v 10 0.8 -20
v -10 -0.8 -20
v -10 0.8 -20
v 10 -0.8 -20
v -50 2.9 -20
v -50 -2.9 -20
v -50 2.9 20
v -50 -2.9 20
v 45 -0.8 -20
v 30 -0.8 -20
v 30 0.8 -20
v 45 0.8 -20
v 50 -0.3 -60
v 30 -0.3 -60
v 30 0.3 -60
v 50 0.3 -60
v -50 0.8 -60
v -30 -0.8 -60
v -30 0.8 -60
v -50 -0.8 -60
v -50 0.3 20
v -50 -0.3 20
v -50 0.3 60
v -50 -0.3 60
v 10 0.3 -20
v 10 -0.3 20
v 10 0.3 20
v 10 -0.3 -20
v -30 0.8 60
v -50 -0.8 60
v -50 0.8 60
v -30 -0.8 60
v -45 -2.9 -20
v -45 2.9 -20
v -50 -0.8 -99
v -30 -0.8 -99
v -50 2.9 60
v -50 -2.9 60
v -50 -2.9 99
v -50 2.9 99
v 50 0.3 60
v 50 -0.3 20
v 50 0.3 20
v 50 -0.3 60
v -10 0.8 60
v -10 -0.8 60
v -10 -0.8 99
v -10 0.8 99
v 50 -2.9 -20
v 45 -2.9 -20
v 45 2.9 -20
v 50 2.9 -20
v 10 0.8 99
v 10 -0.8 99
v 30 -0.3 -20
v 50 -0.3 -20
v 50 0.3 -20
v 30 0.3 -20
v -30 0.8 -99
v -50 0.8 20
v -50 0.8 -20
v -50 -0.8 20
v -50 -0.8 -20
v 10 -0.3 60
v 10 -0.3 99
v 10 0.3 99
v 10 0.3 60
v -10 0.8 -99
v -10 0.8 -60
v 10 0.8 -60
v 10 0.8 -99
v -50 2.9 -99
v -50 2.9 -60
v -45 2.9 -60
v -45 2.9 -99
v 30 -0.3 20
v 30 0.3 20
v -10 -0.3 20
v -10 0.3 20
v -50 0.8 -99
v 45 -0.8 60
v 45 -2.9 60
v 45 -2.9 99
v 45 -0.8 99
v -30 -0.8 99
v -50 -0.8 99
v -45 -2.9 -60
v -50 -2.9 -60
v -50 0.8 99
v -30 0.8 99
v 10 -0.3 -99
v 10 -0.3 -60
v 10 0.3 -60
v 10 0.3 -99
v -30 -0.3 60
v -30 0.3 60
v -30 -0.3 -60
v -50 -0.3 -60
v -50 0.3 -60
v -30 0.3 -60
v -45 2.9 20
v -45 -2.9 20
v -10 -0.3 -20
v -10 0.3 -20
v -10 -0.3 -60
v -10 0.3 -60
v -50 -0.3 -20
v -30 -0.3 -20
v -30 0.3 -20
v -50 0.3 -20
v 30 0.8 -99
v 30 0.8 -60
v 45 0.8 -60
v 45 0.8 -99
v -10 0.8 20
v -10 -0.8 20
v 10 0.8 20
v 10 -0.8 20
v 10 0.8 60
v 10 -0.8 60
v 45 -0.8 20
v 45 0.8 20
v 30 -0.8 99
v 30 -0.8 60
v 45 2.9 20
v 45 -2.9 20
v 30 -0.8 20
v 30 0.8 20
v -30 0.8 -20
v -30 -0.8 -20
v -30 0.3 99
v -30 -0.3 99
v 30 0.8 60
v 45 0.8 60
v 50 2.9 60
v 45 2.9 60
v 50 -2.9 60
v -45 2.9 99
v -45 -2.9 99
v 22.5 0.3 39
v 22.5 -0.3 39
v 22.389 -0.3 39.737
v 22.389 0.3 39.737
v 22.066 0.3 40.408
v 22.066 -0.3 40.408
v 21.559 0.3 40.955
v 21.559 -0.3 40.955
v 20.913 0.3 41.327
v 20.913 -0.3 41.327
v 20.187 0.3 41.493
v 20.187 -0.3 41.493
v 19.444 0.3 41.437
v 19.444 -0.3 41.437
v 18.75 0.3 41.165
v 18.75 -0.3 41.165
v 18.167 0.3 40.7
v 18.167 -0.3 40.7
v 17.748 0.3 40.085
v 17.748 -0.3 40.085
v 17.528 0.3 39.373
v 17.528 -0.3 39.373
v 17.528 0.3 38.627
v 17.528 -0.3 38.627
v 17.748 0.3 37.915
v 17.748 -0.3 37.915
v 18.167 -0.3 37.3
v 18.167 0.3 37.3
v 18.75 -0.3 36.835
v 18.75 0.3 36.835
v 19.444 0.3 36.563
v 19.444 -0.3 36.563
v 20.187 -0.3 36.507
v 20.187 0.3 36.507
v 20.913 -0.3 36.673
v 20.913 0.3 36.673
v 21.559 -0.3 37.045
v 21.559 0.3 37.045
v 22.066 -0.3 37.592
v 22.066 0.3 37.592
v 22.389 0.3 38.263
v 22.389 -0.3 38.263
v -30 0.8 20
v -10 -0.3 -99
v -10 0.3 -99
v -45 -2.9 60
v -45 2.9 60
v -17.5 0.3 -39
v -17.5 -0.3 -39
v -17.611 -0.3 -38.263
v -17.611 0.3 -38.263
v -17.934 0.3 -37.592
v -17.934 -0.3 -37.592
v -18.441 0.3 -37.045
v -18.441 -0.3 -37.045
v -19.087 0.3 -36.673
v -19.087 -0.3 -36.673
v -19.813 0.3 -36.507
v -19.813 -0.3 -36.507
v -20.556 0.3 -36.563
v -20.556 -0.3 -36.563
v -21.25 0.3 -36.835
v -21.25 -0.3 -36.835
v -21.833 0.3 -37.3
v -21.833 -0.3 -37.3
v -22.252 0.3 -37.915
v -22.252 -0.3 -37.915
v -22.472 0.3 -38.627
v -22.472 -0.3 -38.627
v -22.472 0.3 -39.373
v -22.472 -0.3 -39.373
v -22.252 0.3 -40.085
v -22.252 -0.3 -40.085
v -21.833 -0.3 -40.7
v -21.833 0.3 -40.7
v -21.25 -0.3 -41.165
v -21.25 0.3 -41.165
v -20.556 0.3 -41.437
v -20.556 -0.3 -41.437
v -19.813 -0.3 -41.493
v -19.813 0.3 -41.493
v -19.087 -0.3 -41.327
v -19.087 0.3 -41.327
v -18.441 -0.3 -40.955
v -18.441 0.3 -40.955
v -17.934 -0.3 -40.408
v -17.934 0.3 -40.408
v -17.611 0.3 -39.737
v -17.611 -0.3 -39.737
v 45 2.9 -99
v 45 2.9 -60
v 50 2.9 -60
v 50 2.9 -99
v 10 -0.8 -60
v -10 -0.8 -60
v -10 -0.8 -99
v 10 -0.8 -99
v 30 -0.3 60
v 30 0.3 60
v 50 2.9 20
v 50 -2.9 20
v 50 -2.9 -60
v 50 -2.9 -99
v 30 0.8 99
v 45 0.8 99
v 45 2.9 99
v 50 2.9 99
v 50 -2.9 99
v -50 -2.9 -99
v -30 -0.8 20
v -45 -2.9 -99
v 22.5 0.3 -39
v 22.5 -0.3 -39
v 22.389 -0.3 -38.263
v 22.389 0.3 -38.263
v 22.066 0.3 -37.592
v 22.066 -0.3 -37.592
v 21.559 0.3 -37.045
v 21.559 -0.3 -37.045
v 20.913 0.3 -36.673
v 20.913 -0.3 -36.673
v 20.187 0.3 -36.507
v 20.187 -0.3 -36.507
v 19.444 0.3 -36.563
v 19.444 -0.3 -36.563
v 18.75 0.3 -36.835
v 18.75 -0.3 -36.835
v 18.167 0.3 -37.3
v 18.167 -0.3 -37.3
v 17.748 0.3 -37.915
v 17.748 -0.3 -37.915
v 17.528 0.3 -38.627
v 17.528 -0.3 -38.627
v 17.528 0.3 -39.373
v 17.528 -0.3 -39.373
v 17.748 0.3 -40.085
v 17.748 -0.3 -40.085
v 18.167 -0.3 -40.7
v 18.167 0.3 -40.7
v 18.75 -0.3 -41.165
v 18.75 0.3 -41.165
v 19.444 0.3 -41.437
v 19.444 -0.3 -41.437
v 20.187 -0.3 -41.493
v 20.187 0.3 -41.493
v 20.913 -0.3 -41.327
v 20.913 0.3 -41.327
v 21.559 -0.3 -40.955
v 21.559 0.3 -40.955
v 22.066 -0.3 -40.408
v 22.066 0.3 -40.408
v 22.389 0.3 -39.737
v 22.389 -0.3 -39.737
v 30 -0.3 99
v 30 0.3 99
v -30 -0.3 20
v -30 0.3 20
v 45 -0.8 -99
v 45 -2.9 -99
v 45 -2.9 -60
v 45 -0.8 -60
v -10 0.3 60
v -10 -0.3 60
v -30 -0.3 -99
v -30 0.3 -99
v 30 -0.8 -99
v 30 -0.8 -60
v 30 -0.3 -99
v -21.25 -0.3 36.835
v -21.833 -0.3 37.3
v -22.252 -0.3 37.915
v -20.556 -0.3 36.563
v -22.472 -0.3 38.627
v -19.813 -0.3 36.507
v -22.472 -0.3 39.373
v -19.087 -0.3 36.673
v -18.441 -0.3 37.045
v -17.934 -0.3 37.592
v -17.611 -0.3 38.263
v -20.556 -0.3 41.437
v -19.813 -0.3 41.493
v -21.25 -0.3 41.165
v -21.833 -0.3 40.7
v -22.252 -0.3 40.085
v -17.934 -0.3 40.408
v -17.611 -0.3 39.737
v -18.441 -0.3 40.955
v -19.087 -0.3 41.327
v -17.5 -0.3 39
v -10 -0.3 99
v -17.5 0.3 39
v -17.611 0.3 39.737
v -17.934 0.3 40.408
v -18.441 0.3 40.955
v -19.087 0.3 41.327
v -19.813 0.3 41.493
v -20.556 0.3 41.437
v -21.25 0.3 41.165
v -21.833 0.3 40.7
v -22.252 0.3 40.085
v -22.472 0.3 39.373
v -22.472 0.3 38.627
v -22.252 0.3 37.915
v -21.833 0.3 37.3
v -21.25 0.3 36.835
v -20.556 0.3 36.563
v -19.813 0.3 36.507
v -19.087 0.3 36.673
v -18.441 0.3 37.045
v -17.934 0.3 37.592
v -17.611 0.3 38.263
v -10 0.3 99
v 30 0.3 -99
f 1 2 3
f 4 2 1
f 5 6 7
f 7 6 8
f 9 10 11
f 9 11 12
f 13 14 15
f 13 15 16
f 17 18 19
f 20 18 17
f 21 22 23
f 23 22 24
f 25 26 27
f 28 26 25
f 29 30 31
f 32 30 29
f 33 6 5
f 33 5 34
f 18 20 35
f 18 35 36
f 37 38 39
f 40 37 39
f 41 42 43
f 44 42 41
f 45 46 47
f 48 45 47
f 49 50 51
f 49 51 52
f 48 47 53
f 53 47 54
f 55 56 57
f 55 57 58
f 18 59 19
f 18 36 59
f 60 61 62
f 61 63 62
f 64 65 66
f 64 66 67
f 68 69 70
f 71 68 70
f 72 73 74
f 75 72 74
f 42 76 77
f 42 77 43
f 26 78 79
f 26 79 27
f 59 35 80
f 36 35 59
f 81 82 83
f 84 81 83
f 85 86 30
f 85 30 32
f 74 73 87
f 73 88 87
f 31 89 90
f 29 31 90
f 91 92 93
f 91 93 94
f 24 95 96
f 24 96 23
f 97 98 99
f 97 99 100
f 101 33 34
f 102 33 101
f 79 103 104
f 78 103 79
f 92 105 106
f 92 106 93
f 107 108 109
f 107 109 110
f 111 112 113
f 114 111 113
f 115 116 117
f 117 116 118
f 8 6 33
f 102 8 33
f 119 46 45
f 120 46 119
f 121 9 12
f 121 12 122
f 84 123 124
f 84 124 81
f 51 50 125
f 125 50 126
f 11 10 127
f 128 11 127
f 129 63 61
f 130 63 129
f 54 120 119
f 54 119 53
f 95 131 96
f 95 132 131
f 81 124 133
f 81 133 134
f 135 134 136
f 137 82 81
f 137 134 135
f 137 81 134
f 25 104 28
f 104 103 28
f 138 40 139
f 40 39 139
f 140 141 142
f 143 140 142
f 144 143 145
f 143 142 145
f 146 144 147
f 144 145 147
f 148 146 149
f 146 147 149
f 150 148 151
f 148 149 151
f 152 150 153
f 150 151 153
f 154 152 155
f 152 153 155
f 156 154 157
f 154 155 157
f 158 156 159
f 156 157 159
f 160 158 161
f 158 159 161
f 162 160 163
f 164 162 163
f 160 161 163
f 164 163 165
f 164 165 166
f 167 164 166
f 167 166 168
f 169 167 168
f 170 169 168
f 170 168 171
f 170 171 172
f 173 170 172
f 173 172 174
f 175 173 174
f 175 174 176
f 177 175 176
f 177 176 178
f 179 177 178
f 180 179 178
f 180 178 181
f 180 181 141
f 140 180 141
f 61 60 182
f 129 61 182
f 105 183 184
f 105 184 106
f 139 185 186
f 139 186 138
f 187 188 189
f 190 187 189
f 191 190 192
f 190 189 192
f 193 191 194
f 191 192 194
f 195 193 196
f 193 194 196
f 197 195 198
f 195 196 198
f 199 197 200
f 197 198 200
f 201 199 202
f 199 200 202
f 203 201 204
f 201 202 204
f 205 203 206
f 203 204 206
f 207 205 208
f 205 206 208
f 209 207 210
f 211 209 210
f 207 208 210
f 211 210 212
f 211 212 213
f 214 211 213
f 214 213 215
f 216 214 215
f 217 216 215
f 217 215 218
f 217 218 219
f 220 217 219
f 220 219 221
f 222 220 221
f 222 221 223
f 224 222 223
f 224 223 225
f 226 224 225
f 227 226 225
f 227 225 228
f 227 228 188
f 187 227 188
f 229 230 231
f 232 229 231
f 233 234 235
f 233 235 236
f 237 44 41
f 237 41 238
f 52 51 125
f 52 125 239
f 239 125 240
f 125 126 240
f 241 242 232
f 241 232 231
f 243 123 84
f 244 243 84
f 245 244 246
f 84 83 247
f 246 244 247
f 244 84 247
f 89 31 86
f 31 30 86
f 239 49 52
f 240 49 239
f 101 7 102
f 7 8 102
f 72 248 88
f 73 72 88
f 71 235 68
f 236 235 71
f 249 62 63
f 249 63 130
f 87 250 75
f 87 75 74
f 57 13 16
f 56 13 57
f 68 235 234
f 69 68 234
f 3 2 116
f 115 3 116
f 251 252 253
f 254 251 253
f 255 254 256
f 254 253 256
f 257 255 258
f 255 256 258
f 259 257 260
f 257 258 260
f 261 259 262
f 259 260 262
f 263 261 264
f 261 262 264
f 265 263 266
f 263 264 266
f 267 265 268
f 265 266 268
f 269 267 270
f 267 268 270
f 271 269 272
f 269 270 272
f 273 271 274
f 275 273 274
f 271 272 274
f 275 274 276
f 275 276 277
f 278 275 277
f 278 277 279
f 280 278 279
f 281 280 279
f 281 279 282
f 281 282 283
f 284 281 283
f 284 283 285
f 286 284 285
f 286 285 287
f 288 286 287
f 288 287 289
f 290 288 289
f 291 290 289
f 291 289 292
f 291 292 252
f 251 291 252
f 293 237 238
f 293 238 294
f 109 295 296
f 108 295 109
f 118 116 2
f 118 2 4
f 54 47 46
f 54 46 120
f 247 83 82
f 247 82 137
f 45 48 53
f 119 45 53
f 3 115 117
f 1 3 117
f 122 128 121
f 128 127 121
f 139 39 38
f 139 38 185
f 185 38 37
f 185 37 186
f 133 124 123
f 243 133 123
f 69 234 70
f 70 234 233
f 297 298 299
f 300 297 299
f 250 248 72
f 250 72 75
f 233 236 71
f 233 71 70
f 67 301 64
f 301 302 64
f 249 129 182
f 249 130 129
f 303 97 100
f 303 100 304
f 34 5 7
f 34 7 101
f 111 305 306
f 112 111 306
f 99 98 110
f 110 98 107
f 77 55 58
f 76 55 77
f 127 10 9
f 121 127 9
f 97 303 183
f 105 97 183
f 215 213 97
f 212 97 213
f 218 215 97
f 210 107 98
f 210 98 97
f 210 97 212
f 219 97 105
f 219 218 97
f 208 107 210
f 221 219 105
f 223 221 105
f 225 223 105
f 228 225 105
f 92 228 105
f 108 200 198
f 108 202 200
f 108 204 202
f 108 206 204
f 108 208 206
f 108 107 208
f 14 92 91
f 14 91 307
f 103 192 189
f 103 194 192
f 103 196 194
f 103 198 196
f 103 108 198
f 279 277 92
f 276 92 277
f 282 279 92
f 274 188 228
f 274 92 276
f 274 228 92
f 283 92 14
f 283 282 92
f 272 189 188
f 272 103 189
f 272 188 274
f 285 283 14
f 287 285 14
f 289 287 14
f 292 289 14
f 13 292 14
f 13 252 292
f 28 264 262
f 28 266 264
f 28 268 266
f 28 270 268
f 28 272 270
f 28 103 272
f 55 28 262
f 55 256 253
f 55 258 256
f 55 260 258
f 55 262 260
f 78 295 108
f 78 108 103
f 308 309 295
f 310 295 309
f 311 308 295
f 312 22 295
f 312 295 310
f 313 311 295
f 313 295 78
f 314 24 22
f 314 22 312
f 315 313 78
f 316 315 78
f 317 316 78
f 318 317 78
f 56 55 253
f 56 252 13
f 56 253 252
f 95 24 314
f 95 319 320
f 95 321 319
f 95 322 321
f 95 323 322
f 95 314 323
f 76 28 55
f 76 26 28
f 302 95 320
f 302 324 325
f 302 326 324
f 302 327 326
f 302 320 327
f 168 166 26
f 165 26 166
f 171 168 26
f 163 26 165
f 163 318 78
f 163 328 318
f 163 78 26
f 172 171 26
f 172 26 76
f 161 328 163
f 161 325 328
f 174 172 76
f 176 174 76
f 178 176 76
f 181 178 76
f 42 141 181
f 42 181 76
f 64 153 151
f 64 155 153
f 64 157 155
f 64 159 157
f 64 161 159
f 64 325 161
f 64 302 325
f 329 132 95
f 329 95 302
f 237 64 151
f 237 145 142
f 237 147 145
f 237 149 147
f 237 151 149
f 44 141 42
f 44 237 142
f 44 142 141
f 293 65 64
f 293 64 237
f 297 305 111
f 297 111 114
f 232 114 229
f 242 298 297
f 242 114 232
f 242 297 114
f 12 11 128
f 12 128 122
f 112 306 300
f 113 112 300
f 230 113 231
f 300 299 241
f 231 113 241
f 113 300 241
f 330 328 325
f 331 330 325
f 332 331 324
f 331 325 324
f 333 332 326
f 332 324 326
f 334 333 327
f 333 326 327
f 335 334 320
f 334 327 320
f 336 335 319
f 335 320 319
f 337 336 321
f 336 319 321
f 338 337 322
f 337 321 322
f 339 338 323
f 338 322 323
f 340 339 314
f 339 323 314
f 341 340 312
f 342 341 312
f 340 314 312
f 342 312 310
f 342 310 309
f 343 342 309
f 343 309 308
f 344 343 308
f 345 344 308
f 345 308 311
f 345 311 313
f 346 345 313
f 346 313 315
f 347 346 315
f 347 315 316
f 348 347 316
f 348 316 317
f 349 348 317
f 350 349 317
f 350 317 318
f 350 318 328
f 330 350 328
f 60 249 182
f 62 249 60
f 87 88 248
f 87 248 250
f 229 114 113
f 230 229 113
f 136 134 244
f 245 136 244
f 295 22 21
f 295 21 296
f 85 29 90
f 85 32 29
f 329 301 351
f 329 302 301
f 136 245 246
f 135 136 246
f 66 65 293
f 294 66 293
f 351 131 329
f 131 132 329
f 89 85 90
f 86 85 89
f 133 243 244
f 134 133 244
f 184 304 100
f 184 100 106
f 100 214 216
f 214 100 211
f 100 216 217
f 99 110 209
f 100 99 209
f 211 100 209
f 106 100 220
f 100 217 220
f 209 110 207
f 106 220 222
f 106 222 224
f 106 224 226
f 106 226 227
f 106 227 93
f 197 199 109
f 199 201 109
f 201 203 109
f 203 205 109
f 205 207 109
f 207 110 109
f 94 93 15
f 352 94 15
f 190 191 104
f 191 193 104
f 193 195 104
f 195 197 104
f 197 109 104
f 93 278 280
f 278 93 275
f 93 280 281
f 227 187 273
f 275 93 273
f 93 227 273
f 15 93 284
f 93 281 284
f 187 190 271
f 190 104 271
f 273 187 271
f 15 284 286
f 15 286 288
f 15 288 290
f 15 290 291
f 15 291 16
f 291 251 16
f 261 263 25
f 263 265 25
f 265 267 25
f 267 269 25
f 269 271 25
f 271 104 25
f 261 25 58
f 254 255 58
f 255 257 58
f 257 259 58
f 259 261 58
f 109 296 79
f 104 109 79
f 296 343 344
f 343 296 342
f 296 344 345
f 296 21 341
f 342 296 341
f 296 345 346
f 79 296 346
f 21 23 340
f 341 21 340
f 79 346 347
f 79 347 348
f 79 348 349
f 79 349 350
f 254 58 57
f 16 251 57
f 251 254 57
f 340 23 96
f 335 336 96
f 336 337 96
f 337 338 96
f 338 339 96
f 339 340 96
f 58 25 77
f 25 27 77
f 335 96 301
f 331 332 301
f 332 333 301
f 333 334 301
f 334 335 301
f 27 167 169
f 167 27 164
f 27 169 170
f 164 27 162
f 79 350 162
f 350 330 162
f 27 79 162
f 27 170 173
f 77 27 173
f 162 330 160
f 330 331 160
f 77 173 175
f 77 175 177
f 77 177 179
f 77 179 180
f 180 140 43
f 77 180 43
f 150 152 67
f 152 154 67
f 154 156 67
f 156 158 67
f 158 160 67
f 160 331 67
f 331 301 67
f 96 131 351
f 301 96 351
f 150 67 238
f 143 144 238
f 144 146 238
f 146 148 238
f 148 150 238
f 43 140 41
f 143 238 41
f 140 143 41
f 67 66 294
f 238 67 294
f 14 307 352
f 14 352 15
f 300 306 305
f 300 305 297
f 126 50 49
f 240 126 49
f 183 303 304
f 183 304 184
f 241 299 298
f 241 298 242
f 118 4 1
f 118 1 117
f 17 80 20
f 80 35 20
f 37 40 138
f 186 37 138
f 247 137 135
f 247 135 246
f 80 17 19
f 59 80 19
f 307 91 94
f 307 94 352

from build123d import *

# Parameters (mm, degrees)
F0_W     = 5
F0_H     = 39
F1_DEPTH = 2.9
F0_H_2   = 40
F0_W_2   = 15
F2_DEPTH = 0.8
F0_W_3   = 20
F3_DEPTH = 0.3
F4_R     = 2.5
F5_DEPTH = 3.201


with BuildPart() as f1:
    # F0 (on Front) → F1 (new body, symmetric)
    with BuildSketch(Plane.XZ):
        with Locations((-47.5, -79.5)):
            Rectangle(F0_W, F0_H)
    extrude(amount=F1_DEPTH, both=True)


with BuildPart() as f1b:
    # F0 (on Front) → F1, piece 2 (new body, symmetric)
    with BuildSketch(Plane.XZ):
        with Locations((-47.5, 79.5)):
            Rectangle(F0_W, F0_H)
    extrude(amount=F1_DEPTH, both=True)


with BuildPart() as f1c:
    # F0 (on Front) → F1, piece 3 (new body, symmetric)
    with BuildSketch(Plane.XZ):
        with Locations((-47.5, 0)):
            Rectangle(F0_W, F0_H_2)
    extrude(amount=F1_DEPTH, both=True)


with BuildPart() as f1d:
    # F0 (on Front) → F1, piece 4 (new body, symmetric)
    with BuildSketch(Plane.XZ):
        with Locations((47.5, -79.5)):
            Rectangle(F0_W, F0_H)
    extrude(amount=F1_DEPTH, both=True)

    # F0 (on Front) → F2, piece 4 (join, symmetric)
    with BuildSketch(Plane.XZ):
        with Locations((37.5, -79.5)):
            Rectangle(F0_W_2, F0_H)
    extrude(amount=F2_DEPTH, both=True)


with BuildPart() as f1e:
    # F0 (on Front) → F1, piece 5 (new body, symmetric)
    with BuildSketch(Plane.XZ):
        with Locations((47.5, 79.5)):
            Rectangle(F0_W, F0_H)
    extrude(amount=F1_DEPTH, both=True)

    # F0 (on Front) → F2, piece 5 (join, symmetric)
    with BuildSketch(Plane.XZ):
        with Locations((37.5, 79.5)):
            Rectangle(F0_W_2, F0_H)
    extrude(amount=F2_DEPTH, both=True)


with BuildPart() as f1f:
    # F0 (on Front) → F1, piece 6 (new body, symmetric)
    with BuildSketch(Plane.XZ):
        with Locations((47.5, 0)):
            Rectangle(F0_W, F0_H_2)
    extrude(amount=F1_DEPTH, both=True)


with BuildPart() as f2:
    # F0 (on Front) → F2 (new body, symmetric)
    with BuildSketch(Plane.XZ):
        with Locations((-37.5, -79.5)):
            Rectangle(F0_W_2, F0_H)
        with Locations((-47.5, -79.5)):
            Rectangle(F0_W, F0_H)
    extrude(amount=F2_DEPTH, both=True)


with BuildPart() as f2b:
    # F0 (on Front) → F2, piece 2 (new body, symmetric)
    with BuildSketch(Plane.XZ):
        with Locations((-37.5, 79.5)):
            Rectangle(F0_W_2, F0_H)
        with Locations((-47.5, 79.5)):
            Rectangle(F0_W, F0_H)
    extrude(amount=F2_DEPTH, both=True)


with BuildPart() as f2c:
    # F0 (on Front) → F2, piece 3 (new body, symmetric)
    with BuildSketch(Plane.XZ):
        with Locations((-37.5, 0)):
            Rectangle(F0_W_2, F0_H_2)
        with Locations((-47.5, 0)):
            Rectangle(F0_W, F0_H_2)
    extrude(amount=F2_DEPTH, both=True)


with BuildPart() as f2d:
    # F0 (on Front) → F2, piece 6 (new body, symmetric)
    with BuildSketch(Plane.XZ):
        with Locations((37.5, 0)):
            Rectangle(F0_W_2, F0_H_2)
    extrude(amount=F2_DEPTH, both=True)


with BuildPart() as f2e:
    # F0 (on Front) → F2, piece 7 (new body, symmetric)
    with BuildSketch(Plane.XZ):
        with Locations((0, -79.5)):
            Rectangle(F0_W_3, F0_H)
    extrude(amount=F2_DEPTH, both=True)


with BuildPart() as f2f:
    # F0 (on Front) → F2, piece 8 (new body, symmetric)
    with BuildSketch(Plane.XZ):
        with Locations((0, 79.5)):
            Rectangle(F0_W_3, F0_H)
    extrude(amount=F2_DEPTH, both=True)


with BuildPart() as f2g:
    # F0 (on Front) → F2, piece 9 (new body, symmetric)
    with BuildSketch(Plane.XZ):
        Rectangle(F0_W_3, F0_H_2)
    extrude(amount=F2_DEPTH, both=True)


with BuildPart() as f3:
    # F0 (on Front) → F3 (new body, symmetric)
    with BuildSketch(Plane.XZ):
        with Locations((-20, 79.5)):
            Rectangle(F0_W_3, F0_H)
        with Locations((-20, 40)):
            Rectangle(F0_W_3, F0_H_2)
        with Locations((-20, 0)):
            Rectangle(F0_W_3, F0_H_2)
        with Locations((-20, -40)):
            Rectangle(F0_W_3, F0_H_2)
        with Locations((-20, -79.5)):
            Rectangle(F0_W_3, F0_H)
        with Locations((20, 79.5)):
            Rectangle(F0_W_3, F0_H)
        with Locations((20, 40)):
            Rectangle(F0_W_3, F0_H_2)
        with Locations((20, 0)):
            Rectangle(F0_W_3, F0_H_2)
        with Locations((20, -40)):
            Rectangle(F0_W_3, F0_H_2)
        with Locations((20, -79.5)):
            Rectangle(F0_W_3, F0_H)
        with Locations((-47.5, 40)):
            Rectangle(F0_W, F0_H_2)
        with Locations((-37.5, 40)):
            Rectangle(F0_W_2, F0_H_2)
        with Locations((0, 40)):
            Rectangle(F0_W_3, F0_H_2)
        with Locations((37.5, 40)):
            Rectangle(F0_W_2, F0_H_2)
        with Locations((47.5, 40)):
            Rectangle(F0_W, F0_H_2)
        with Locations((47.5, -40)):
            Rectangle(F0_W, F0_H_2)
        with Locations((37.5, -40)):
            Rectangle(F0_W_2, F0_H_2)
        with Locations((0, -40)):
            Rectangle(F0_W_3, F0_H_2)
        with Locations((-37.5, -40)):
            Rectangle(F0_W_2, F0_H_2)
        with Locations((-47.5, -40)):
            Rectangle(F0_W, F0_H_2)
    extrude(amount=F3_DEPTH, both=True)

    # F4 (on face) → F5 (cut, through all)
    with BuildSketch(Plane.XZ.offset(0.3)):
        with Locations((-20, 39)):
            Circle(F4_R)
        with Locations((20, 39)):
            Circle(F4_R)
        with Locations((-20, -39)):
            Circle(F4_R)
        with Locations((20, -39)):
            Circle(F4_R)
    extrude(amount=-F5_DEPTH, mode=Mode.SUBTRACT)


solid = Compound([f1.part, f1b.part, f1c.part, f1d.part, f1e.part, f1f.part, f2.part, f2b.part, f2c.part, f2d.part, f2e.part, f2f.part, f2g.part, f3.part])
